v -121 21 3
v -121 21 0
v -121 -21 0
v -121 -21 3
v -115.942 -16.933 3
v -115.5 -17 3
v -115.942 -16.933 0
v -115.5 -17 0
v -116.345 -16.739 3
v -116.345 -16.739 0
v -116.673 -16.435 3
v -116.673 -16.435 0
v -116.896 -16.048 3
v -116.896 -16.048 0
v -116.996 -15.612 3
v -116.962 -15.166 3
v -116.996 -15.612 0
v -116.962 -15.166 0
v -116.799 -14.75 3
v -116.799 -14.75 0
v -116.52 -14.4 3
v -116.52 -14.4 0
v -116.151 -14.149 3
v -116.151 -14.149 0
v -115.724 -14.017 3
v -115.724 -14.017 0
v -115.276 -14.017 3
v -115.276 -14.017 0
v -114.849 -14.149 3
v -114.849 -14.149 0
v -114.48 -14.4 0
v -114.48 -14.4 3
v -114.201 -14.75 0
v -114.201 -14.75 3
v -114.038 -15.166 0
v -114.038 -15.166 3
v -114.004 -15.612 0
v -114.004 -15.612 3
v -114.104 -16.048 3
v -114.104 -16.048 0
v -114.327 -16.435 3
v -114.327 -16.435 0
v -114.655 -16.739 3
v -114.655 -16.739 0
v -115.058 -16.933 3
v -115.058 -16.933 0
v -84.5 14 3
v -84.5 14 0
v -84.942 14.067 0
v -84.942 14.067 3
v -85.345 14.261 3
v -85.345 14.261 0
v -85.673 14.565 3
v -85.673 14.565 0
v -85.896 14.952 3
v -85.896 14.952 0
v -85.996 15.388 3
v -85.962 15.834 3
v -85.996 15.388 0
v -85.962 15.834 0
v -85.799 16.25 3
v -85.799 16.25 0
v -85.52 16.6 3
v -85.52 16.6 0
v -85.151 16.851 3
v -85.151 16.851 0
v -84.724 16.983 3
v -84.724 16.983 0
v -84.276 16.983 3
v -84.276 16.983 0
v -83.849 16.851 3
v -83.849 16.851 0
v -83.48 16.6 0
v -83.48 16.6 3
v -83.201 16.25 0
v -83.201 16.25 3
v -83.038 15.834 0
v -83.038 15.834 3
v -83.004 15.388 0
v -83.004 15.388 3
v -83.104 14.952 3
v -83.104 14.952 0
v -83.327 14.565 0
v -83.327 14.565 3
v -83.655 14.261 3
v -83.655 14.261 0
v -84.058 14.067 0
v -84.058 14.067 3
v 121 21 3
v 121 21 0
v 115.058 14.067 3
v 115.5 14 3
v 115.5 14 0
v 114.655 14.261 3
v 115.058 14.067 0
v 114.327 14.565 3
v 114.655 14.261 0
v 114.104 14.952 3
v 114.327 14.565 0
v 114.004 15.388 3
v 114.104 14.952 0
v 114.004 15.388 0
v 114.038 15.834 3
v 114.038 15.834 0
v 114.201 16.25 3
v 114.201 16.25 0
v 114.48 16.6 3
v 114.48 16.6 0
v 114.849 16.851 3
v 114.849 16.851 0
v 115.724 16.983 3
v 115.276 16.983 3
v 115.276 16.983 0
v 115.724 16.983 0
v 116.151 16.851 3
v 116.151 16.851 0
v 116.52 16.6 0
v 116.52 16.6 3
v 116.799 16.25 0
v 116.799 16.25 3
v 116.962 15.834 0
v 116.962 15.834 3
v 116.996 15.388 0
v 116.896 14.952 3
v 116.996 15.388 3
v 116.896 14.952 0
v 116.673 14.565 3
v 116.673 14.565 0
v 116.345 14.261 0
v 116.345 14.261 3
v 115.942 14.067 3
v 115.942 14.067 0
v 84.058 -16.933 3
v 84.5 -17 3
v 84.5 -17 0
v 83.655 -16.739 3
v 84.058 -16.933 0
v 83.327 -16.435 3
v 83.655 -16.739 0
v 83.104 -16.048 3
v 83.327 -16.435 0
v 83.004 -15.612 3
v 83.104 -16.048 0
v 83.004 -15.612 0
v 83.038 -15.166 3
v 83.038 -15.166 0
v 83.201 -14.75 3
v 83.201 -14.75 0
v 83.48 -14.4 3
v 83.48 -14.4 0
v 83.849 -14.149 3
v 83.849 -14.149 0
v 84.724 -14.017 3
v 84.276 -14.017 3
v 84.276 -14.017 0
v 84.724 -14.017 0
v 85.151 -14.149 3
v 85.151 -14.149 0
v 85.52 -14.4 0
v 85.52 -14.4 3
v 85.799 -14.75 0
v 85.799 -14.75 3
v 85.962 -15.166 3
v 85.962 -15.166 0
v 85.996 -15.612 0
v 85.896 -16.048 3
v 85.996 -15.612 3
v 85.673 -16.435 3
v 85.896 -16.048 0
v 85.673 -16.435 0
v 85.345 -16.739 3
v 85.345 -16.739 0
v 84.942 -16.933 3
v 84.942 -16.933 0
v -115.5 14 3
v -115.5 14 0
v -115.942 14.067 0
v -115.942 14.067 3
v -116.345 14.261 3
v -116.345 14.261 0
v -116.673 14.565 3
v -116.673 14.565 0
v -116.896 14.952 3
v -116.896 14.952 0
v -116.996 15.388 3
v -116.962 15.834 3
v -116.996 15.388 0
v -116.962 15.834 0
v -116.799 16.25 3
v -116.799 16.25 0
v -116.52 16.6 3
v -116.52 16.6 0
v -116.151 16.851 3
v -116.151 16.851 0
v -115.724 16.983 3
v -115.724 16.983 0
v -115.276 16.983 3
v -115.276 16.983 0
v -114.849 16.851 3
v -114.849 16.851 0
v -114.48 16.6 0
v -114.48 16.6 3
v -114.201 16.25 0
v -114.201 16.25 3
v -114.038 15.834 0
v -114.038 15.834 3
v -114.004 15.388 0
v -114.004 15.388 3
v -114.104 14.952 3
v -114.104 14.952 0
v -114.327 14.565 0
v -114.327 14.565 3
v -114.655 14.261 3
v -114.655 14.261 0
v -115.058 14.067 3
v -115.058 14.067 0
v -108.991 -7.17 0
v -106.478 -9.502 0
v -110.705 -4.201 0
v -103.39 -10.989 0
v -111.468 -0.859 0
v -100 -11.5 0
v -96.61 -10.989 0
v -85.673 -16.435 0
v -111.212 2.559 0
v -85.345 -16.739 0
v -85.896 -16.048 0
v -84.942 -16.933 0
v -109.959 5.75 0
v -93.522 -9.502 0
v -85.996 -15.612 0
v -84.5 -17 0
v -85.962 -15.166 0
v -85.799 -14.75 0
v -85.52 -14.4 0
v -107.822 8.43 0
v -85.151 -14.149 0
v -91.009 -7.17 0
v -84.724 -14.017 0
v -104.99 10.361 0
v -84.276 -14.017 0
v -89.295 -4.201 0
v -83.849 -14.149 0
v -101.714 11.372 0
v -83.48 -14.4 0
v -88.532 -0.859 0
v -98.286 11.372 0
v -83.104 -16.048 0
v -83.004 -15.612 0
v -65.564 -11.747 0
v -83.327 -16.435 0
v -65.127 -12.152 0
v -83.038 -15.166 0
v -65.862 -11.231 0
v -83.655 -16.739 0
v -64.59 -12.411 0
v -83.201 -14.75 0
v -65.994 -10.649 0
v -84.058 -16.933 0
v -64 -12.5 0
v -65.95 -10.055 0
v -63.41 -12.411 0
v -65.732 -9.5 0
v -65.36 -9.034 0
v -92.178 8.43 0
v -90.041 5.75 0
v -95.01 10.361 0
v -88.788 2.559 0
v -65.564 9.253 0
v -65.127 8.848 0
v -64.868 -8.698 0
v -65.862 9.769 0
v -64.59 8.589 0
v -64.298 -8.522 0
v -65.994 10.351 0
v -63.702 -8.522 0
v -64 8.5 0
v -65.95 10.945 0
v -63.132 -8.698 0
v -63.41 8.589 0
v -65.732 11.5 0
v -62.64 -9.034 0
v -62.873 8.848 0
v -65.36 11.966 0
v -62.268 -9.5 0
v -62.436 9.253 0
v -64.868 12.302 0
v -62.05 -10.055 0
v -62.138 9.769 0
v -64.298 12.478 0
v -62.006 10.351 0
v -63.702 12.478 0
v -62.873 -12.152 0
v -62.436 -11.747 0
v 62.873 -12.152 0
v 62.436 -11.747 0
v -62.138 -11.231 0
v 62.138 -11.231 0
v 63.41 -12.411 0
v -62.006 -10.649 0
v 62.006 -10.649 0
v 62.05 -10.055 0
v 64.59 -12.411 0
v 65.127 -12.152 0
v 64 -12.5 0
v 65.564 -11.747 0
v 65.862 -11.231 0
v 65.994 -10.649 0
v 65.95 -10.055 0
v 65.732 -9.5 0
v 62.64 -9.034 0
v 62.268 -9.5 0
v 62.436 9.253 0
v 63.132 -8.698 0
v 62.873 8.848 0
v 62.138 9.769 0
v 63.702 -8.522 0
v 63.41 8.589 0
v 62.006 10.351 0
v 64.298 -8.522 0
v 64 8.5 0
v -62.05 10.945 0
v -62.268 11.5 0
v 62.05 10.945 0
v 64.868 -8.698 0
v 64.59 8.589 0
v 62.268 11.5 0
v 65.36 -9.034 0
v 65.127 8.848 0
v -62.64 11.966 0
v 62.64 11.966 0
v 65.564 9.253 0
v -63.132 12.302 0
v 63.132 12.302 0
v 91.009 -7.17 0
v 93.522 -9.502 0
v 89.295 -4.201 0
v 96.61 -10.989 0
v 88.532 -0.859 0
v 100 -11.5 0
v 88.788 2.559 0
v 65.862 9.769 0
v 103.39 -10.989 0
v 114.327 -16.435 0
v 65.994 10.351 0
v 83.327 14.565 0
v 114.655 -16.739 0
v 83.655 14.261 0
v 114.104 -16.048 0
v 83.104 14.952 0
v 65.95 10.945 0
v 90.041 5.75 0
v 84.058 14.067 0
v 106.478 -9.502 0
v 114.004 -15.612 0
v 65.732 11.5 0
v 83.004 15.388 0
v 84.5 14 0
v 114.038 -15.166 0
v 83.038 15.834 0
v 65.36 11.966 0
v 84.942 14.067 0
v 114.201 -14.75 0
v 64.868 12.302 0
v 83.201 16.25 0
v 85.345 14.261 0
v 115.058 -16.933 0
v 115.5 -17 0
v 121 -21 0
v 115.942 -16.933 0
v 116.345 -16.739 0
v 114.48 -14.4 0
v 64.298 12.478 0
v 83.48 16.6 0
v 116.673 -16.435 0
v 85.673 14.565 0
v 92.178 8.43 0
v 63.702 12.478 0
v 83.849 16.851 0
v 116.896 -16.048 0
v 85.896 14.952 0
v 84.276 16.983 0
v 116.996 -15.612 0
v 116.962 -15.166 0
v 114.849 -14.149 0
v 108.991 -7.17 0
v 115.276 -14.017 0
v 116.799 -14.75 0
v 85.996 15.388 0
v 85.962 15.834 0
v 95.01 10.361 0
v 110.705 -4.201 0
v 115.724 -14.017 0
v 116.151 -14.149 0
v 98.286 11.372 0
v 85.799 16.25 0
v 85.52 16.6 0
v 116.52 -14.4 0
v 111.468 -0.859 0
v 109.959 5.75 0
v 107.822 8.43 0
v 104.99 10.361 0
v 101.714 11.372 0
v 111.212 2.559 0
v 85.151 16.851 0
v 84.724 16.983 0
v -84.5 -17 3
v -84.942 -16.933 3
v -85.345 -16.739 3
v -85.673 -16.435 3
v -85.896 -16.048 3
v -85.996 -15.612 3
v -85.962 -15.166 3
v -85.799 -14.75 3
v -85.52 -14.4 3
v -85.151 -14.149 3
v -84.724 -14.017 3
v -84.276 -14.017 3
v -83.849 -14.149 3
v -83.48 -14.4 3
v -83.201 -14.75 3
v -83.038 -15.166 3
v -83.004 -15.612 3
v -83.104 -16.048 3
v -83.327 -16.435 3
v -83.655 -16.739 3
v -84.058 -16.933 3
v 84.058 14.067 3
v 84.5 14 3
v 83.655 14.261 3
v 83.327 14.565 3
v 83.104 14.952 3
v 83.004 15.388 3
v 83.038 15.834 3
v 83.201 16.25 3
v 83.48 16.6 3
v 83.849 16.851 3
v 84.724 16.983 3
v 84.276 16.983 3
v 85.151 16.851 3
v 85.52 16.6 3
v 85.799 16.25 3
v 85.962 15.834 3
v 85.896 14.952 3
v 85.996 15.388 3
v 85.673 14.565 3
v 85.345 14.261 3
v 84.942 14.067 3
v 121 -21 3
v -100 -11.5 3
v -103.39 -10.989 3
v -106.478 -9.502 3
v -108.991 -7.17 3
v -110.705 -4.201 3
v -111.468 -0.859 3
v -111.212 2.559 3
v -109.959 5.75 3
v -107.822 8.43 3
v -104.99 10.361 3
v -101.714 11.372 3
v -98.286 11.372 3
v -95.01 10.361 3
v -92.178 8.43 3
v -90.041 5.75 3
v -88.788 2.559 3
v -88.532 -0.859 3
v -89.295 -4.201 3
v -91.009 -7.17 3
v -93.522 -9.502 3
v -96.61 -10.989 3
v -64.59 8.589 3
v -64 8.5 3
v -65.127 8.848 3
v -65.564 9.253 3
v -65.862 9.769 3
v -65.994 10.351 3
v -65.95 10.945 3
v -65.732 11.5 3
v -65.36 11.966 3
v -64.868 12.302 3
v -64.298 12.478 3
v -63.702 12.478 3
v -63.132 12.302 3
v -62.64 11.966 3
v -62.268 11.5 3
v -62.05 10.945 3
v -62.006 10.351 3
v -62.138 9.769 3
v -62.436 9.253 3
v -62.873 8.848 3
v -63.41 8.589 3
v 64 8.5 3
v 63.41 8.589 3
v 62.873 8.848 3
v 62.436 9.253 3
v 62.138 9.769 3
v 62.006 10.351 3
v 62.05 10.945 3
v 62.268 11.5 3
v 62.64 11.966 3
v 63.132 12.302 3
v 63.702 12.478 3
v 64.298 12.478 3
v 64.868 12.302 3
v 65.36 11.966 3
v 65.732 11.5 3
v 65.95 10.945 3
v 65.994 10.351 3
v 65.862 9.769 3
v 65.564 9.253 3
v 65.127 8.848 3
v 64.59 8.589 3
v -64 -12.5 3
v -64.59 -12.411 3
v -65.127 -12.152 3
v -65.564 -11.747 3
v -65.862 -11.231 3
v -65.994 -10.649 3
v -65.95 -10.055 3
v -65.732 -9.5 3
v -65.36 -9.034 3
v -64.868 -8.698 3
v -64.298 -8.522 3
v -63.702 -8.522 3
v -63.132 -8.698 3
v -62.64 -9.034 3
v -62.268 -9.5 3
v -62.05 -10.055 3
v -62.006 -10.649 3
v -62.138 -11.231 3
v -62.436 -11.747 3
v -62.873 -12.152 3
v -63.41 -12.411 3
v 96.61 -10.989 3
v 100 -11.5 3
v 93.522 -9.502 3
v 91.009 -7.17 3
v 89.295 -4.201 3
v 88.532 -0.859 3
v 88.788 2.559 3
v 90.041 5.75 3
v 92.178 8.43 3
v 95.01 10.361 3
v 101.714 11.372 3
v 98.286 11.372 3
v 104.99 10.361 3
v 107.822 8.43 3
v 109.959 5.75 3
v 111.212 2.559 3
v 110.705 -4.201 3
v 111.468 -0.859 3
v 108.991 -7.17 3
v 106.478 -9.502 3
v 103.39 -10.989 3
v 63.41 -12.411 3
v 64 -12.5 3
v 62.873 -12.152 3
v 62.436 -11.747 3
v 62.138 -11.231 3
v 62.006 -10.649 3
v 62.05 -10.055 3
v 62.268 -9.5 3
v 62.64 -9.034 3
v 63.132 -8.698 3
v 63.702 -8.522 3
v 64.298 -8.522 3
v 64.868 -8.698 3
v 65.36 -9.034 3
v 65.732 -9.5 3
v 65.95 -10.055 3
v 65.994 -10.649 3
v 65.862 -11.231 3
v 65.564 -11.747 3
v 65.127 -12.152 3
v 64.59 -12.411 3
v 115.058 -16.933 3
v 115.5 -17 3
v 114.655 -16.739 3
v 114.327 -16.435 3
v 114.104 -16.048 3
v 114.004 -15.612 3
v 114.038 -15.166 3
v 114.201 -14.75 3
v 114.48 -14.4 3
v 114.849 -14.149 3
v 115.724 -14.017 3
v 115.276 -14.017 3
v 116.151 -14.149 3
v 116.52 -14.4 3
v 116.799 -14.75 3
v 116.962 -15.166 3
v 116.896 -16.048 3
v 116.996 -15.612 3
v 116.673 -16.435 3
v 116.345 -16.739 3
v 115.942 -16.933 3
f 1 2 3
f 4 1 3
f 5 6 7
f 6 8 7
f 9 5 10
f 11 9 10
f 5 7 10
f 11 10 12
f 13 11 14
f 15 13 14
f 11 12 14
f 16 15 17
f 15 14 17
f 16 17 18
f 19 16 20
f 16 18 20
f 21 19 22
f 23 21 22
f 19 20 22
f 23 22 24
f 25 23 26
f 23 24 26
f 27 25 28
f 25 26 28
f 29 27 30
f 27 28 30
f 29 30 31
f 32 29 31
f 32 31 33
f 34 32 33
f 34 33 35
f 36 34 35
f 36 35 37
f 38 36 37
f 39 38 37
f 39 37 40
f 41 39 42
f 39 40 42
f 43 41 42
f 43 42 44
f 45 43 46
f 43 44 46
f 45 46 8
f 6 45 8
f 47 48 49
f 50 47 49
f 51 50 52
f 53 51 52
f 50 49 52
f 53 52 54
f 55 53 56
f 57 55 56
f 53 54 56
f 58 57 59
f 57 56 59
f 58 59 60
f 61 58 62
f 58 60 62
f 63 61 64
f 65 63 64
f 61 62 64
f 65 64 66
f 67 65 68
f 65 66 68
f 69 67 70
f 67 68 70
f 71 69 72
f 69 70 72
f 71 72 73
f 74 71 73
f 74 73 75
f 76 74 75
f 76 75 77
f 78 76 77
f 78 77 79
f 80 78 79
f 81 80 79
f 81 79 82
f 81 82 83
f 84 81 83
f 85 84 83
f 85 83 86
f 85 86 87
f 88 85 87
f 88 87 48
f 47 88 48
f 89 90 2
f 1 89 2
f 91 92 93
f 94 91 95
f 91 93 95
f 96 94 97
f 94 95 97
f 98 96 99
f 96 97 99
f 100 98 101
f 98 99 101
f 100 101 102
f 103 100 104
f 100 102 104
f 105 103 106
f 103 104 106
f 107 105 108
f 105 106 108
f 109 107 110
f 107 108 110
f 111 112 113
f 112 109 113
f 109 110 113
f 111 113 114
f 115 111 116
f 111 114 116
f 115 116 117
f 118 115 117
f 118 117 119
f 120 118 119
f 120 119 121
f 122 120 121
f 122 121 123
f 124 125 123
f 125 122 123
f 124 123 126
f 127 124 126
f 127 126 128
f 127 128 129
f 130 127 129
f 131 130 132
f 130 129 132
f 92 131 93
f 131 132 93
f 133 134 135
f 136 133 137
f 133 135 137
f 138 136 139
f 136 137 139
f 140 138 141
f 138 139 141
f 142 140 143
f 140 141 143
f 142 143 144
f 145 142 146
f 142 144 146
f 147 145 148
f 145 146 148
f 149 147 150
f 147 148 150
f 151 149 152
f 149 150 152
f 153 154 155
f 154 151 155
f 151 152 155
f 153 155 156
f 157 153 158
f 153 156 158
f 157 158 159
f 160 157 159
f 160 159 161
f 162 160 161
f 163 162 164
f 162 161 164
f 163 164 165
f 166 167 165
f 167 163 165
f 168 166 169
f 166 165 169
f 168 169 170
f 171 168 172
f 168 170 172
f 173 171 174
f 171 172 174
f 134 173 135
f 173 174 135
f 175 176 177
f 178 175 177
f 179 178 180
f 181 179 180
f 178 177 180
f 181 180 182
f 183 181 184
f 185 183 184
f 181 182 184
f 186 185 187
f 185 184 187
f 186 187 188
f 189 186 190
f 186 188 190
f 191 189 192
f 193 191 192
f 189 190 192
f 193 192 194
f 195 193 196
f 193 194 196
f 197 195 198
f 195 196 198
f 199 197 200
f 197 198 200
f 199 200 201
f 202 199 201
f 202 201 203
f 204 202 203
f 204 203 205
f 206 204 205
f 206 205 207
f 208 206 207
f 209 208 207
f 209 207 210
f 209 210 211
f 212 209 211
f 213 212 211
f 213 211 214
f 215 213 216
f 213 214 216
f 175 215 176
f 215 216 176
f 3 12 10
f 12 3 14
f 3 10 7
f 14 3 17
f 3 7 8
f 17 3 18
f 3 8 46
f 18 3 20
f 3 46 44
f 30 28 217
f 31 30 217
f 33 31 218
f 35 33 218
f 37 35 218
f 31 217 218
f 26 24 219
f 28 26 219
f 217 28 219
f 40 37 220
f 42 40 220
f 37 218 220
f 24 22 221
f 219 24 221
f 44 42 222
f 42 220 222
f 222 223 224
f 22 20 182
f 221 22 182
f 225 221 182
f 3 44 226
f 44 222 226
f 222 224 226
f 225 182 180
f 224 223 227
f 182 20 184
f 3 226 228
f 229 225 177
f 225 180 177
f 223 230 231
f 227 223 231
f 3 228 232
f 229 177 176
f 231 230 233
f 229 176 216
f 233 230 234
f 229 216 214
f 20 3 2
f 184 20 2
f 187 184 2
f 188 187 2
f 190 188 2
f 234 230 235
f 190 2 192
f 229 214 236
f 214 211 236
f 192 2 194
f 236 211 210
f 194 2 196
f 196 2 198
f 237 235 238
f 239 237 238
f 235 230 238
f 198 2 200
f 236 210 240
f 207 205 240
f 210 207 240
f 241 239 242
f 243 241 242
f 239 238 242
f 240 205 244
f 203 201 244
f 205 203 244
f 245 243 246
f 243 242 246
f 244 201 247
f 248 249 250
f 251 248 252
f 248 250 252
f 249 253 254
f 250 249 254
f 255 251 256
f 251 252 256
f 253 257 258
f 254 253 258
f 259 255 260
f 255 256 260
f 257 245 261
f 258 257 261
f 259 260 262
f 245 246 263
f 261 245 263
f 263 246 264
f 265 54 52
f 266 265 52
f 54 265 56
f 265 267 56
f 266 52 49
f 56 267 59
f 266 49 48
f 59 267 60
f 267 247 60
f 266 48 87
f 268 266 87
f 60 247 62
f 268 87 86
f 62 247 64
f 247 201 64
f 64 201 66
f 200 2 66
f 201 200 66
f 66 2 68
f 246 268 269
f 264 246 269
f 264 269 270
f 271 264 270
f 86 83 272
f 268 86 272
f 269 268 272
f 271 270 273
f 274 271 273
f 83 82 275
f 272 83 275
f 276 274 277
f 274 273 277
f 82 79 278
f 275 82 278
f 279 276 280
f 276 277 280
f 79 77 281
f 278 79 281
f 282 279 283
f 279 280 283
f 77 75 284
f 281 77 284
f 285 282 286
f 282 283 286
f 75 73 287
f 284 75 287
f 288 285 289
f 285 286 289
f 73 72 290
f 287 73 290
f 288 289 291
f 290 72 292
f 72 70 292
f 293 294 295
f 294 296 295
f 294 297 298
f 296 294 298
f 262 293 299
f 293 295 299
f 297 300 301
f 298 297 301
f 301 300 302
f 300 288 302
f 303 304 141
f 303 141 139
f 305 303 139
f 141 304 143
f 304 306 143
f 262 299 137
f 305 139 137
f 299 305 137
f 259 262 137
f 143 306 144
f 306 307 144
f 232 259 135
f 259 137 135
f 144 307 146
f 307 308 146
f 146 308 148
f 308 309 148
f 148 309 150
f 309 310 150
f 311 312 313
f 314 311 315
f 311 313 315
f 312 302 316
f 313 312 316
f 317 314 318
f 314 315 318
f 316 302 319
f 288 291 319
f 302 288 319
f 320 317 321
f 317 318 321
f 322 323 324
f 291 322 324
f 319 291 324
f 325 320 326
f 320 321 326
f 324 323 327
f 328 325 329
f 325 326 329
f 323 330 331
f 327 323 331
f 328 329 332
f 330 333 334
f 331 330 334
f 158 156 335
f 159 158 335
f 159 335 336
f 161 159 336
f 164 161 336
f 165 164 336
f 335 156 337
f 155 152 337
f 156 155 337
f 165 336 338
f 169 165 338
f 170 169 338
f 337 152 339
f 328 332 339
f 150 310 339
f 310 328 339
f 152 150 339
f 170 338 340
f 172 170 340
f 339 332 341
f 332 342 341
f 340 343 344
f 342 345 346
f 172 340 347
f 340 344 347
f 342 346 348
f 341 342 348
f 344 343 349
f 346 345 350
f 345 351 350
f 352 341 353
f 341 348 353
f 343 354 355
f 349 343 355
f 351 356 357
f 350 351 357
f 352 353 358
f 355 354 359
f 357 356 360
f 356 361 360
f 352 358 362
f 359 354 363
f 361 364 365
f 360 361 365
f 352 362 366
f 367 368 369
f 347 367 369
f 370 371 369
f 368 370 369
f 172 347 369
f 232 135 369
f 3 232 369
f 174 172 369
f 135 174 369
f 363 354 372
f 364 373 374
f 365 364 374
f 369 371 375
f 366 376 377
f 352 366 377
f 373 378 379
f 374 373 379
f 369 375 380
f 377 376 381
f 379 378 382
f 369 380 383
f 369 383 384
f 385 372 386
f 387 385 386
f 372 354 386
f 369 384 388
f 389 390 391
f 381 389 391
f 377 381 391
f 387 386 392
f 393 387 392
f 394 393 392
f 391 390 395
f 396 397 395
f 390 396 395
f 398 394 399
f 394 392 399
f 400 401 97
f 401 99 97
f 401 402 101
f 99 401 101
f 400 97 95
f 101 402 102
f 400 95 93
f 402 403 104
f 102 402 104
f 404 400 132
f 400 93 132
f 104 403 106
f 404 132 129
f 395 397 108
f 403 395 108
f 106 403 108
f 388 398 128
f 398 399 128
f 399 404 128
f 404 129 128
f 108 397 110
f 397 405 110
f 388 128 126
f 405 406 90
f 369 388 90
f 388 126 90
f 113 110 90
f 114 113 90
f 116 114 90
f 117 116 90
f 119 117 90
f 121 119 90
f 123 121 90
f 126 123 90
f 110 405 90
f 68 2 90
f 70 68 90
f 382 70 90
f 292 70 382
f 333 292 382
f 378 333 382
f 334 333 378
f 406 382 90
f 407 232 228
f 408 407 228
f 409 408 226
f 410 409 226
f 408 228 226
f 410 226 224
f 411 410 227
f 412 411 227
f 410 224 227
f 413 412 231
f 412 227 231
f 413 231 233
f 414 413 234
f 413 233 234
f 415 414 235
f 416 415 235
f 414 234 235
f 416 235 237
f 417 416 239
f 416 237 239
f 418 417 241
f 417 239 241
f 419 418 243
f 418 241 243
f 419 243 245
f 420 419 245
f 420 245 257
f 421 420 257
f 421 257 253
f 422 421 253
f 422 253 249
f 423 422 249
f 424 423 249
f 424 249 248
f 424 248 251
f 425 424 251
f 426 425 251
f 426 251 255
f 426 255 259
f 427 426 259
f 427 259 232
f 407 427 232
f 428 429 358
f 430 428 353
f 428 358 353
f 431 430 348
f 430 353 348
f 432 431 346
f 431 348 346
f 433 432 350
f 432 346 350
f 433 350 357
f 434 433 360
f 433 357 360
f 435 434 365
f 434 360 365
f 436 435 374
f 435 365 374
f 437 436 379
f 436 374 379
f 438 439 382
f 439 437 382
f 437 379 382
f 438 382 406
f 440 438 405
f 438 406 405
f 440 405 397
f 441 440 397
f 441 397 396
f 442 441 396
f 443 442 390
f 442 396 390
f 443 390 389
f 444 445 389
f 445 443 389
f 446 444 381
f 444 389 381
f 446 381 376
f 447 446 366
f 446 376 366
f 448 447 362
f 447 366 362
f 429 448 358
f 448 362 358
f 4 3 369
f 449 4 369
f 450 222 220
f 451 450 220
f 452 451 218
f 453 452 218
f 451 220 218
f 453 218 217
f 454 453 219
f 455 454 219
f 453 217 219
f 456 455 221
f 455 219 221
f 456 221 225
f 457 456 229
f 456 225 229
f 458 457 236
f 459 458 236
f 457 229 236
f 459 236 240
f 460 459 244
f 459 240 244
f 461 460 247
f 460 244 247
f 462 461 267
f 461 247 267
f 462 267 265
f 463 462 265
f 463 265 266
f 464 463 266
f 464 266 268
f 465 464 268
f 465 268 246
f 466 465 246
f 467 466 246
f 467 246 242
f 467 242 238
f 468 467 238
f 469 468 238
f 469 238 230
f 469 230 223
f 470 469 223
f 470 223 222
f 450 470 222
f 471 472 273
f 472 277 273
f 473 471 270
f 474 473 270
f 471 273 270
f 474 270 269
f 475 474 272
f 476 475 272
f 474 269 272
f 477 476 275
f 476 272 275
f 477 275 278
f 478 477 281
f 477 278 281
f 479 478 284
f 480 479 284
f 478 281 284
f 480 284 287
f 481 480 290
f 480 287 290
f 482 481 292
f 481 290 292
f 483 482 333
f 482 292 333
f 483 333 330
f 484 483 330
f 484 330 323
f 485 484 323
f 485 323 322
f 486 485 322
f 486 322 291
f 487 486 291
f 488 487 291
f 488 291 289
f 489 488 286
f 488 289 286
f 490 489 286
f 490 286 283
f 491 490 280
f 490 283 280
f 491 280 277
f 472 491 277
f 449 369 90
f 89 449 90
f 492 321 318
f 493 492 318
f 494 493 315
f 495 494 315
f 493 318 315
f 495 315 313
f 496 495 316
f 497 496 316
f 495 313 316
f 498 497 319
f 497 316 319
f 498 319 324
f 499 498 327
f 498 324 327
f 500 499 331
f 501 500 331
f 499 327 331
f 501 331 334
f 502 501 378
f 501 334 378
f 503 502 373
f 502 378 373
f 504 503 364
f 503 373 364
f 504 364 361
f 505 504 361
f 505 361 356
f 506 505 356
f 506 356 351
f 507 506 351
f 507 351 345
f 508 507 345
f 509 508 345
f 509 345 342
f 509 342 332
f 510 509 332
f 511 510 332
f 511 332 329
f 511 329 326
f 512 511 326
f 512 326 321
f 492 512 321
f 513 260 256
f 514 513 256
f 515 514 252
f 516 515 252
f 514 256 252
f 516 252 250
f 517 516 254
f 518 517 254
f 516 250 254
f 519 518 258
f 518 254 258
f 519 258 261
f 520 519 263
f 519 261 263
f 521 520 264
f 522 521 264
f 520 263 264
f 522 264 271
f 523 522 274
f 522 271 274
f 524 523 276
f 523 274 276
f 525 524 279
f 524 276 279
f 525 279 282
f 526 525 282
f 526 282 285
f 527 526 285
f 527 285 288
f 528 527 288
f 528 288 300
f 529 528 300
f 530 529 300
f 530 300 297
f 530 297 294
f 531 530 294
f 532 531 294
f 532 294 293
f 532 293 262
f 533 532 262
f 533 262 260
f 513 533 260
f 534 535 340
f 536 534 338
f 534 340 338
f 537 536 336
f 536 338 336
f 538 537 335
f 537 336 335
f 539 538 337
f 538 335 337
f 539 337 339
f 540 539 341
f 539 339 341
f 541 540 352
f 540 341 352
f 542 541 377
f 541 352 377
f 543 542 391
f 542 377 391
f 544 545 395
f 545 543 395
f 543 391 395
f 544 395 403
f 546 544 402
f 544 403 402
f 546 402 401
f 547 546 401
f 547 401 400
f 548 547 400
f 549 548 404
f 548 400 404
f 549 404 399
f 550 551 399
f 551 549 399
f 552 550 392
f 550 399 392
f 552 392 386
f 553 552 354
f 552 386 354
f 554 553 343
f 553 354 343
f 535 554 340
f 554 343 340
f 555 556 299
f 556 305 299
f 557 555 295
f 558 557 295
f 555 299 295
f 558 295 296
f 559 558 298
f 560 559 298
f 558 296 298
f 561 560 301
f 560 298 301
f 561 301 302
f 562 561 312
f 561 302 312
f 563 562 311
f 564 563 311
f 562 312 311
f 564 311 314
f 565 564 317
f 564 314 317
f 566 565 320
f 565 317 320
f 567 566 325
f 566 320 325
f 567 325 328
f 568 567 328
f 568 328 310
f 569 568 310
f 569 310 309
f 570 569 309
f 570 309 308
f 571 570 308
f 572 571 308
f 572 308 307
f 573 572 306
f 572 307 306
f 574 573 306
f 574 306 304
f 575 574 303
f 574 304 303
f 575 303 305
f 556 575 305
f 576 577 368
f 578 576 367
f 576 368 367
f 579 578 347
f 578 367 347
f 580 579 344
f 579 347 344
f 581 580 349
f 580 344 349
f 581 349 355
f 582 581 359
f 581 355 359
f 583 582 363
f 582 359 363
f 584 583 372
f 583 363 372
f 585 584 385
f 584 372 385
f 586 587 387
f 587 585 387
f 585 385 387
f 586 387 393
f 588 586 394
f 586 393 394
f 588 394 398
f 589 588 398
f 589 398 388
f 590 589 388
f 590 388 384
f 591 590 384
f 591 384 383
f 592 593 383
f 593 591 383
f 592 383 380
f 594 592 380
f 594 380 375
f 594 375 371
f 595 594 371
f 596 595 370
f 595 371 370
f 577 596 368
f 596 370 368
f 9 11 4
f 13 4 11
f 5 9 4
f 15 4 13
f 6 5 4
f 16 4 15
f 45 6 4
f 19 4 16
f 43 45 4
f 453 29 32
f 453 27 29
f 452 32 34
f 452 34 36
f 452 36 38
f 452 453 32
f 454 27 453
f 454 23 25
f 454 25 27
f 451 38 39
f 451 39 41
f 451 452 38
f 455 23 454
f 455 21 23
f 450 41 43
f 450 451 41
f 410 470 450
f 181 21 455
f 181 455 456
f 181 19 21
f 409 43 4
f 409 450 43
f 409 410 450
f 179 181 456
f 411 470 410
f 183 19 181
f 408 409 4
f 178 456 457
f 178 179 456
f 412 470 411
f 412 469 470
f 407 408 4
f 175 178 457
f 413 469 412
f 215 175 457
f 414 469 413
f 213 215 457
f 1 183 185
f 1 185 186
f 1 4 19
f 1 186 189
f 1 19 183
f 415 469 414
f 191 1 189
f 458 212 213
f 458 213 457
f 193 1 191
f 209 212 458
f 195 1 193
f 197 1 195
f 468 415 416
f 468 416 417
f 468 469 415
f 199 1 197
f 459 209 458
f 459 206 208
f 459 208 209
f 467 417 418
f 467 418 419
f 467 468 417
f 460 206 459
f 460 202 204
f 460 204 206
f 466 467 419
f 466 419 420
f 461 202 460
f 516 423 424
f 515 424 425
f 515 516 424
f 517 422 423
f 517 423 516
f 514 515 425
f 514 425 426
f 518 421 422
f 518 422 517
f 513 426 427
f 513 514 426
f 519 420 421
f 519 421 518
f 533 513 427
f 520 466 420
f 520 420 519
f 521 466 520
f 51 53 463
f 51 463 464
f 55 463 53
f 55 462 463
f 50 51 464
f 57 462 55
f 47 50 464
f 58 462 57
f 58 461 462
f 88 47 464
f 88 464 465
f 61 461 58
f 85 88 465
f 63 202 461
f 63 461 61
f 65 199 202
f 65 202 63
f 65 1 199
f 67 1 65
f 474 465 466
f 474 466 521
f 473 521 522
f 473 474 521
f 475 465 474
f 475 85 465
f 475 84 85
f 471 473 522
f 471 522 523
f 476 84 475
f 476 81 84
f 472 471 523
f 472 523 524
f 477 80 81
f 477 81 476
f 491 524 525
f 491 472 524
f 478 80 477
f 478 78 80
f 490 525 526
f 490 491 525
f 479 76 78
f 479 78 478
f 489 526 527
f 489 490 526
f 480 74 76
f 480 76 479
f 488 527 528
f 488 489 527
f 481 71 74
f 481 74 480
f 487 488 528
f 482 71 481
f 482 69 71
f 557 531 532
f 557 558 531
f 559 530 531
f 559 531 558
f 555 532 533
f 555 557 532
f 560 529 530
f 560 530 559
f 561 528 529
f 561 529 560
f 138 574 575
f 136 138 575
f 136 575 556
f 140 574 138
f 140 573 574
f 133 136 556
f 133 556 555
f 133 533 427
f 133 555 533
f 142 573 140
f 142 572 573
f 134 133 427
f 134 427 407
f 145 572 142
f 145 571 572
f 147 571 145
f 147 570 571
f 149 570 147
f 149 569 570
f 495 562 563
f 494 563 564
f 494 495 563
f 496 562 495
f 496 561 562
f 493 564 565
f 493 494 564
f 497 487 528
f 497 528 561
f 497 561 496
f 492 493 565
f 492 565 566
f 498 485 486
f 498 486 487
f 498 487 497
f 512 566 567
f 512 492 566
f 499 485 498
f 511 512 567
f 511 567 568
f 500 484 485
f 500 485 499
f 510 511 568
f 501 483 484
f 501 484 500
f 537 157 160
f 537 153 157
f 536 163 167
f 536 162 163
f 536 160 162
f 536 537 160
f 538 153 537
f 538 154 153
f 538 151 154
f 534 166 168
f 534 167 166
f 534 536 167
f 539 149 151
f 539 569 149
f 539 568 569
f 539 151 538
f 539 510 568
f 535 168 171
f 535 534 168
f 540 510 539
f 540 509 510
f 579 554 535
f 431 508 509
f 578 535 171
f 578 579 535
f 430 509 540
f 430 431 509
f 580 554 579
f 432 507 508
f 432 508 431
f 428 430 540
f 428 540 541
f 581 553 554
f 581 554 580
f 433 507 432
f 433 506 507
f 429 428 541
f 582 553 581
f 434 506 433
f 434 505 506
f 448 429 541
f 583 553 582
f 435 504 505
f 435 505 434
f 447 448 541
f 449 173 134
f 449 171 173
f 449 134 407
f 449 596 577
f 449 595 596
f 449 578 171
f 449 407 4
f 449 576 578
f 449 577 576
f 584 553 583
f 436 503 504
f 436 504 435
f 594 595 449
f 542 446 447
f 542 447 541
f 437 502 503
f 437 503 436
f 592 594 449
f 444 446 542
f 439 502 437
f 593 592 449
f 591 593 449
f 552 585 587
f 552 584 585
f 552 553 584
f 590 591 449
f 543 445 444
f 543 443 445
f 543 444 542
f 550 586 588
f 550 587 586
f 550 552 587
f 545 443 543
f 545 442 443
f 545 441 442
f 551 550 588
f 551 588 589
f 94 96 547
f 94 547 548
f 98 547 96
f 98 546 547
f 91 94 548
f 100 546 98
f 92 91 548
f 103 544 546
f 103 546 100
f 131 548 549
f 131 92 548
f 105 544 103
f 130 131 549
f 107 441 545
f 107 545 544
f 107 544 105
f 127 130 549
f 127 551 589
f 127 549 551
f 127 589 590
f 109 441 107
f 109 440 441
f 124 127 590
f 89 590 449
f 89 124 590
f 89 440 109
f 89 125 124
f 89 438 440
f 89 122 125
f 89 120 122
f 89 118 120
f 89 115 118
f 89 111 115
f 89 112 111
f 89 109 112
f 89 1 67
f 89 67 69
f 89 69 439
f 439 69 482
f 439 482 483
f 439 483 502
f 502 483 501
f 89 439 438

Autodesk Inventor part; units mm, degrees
ref_plane "YZ Plane" through (0, 0, 0) normal (1, 0, 0) x (0, 1, 0)
ref_plane "XZ Plane" through (0, 0, 0) normal (0, 1, 0) x (-1, 0, 0)
ref_plane "XY Plane" through (0, 0, 0) normal (0, 0, 1) x (1, 0, 0)
sketch "Esboço1" plane through (0, 0, 0) normal (0, 0, 1) x (1, 0, 0)
  line L0 (-121, -21) -> (121, -21)
  line L1 (121, -21) -> (121, 21)
  line L2 (121, 21) -> (-121, 21)
  line L3 (-121, 21) -> (-121, -21)
  line L4 (-121, -21) -> (121, 21) construction
  line L5 (121, -21) -> (-121, 21) construction
  point P0 (0, 0)
  dimension "d0" = 242
  dimension "d1" = 42
extrude "Extrusão1" add sketch "Esboço1" along normal blind 3
sketch "Esboço2" plane through (0, 0, 3) normal (0, 0, 1) x (1, 0, 0)
  line L0 (121, 21) -> (-121, 21) projected
  line L1 (-121, 21) -> (-79, 21)
  line L2 (-79, 21) -> (-79, -21)
  line L3 (-79, -21) -> (-121, -21)
  line L4 (-121, -21) -> (-121, 21)
  line L5 (-115.5, -15.5) -> (-84.5, -15.5)
  line L6 (-84.5, -15.5) -> (-84.5, 15.5)
  line L7 (-84.5, 15.5) -> (-115.5, 15.5)
  line L8 (-115.5, 15.5) -> (-115.5, -15.5)
  line L9 (-115.5, -15.5) -> (-84.5, 15.5) construction
  line L10 (-84.5, -15.5) -> (-115.5, 15.5) construction
  point P0 (0, 0)
  point P1 (-100, 0)
  point P2 (-100, 21)
  point P3 (-100, 15.5)
  point P4 (-121, 0)
  point P5 (-115.5, 0)
  dimension "d4" = 42
  dimension "d5" = 42
  dimension "d6" = 31
  dimension "d7" = 31
hole "Furo1" at (-115.5, 15.5, 3) at (-84.5, 15.5, 3) at (-84.5, -15.5, 3) at (-115.5, -15.5, 3) direction (0, 0, -1) diameter 3 end through all
hole "Furo2" at (-100, 0, 3) direction (0, 0, -1) diameter 23 end through all
mirror "Espelhamento1" about plane through (0, 0, 0) normal (1, 0, 0) of "Furo1", "Furo2"
sketch "Esboço3" plane through (0, 0, 3) normal (0, 0, 1) x (1, 0, 0)
  circle A0 centre (64, 10.5) radius 1.621 projected
  circle A1 centre (64, -10.5) radius 1.621 projected
  circle A2 centre (-64, 10.5) radius 1.621 projected
  circle A3 centre (-64, -10.5) radius 1.621 projected
  point P0 (0, 0)
hole "Furo3" at (64, -10.5, 3) at (64, 10.5, 3) at (-64, 10.5, 3) at (-64, -10.5, 3) direction (0, 0, -1) diameter 4 end through all
properties part number "chapa lateral"
